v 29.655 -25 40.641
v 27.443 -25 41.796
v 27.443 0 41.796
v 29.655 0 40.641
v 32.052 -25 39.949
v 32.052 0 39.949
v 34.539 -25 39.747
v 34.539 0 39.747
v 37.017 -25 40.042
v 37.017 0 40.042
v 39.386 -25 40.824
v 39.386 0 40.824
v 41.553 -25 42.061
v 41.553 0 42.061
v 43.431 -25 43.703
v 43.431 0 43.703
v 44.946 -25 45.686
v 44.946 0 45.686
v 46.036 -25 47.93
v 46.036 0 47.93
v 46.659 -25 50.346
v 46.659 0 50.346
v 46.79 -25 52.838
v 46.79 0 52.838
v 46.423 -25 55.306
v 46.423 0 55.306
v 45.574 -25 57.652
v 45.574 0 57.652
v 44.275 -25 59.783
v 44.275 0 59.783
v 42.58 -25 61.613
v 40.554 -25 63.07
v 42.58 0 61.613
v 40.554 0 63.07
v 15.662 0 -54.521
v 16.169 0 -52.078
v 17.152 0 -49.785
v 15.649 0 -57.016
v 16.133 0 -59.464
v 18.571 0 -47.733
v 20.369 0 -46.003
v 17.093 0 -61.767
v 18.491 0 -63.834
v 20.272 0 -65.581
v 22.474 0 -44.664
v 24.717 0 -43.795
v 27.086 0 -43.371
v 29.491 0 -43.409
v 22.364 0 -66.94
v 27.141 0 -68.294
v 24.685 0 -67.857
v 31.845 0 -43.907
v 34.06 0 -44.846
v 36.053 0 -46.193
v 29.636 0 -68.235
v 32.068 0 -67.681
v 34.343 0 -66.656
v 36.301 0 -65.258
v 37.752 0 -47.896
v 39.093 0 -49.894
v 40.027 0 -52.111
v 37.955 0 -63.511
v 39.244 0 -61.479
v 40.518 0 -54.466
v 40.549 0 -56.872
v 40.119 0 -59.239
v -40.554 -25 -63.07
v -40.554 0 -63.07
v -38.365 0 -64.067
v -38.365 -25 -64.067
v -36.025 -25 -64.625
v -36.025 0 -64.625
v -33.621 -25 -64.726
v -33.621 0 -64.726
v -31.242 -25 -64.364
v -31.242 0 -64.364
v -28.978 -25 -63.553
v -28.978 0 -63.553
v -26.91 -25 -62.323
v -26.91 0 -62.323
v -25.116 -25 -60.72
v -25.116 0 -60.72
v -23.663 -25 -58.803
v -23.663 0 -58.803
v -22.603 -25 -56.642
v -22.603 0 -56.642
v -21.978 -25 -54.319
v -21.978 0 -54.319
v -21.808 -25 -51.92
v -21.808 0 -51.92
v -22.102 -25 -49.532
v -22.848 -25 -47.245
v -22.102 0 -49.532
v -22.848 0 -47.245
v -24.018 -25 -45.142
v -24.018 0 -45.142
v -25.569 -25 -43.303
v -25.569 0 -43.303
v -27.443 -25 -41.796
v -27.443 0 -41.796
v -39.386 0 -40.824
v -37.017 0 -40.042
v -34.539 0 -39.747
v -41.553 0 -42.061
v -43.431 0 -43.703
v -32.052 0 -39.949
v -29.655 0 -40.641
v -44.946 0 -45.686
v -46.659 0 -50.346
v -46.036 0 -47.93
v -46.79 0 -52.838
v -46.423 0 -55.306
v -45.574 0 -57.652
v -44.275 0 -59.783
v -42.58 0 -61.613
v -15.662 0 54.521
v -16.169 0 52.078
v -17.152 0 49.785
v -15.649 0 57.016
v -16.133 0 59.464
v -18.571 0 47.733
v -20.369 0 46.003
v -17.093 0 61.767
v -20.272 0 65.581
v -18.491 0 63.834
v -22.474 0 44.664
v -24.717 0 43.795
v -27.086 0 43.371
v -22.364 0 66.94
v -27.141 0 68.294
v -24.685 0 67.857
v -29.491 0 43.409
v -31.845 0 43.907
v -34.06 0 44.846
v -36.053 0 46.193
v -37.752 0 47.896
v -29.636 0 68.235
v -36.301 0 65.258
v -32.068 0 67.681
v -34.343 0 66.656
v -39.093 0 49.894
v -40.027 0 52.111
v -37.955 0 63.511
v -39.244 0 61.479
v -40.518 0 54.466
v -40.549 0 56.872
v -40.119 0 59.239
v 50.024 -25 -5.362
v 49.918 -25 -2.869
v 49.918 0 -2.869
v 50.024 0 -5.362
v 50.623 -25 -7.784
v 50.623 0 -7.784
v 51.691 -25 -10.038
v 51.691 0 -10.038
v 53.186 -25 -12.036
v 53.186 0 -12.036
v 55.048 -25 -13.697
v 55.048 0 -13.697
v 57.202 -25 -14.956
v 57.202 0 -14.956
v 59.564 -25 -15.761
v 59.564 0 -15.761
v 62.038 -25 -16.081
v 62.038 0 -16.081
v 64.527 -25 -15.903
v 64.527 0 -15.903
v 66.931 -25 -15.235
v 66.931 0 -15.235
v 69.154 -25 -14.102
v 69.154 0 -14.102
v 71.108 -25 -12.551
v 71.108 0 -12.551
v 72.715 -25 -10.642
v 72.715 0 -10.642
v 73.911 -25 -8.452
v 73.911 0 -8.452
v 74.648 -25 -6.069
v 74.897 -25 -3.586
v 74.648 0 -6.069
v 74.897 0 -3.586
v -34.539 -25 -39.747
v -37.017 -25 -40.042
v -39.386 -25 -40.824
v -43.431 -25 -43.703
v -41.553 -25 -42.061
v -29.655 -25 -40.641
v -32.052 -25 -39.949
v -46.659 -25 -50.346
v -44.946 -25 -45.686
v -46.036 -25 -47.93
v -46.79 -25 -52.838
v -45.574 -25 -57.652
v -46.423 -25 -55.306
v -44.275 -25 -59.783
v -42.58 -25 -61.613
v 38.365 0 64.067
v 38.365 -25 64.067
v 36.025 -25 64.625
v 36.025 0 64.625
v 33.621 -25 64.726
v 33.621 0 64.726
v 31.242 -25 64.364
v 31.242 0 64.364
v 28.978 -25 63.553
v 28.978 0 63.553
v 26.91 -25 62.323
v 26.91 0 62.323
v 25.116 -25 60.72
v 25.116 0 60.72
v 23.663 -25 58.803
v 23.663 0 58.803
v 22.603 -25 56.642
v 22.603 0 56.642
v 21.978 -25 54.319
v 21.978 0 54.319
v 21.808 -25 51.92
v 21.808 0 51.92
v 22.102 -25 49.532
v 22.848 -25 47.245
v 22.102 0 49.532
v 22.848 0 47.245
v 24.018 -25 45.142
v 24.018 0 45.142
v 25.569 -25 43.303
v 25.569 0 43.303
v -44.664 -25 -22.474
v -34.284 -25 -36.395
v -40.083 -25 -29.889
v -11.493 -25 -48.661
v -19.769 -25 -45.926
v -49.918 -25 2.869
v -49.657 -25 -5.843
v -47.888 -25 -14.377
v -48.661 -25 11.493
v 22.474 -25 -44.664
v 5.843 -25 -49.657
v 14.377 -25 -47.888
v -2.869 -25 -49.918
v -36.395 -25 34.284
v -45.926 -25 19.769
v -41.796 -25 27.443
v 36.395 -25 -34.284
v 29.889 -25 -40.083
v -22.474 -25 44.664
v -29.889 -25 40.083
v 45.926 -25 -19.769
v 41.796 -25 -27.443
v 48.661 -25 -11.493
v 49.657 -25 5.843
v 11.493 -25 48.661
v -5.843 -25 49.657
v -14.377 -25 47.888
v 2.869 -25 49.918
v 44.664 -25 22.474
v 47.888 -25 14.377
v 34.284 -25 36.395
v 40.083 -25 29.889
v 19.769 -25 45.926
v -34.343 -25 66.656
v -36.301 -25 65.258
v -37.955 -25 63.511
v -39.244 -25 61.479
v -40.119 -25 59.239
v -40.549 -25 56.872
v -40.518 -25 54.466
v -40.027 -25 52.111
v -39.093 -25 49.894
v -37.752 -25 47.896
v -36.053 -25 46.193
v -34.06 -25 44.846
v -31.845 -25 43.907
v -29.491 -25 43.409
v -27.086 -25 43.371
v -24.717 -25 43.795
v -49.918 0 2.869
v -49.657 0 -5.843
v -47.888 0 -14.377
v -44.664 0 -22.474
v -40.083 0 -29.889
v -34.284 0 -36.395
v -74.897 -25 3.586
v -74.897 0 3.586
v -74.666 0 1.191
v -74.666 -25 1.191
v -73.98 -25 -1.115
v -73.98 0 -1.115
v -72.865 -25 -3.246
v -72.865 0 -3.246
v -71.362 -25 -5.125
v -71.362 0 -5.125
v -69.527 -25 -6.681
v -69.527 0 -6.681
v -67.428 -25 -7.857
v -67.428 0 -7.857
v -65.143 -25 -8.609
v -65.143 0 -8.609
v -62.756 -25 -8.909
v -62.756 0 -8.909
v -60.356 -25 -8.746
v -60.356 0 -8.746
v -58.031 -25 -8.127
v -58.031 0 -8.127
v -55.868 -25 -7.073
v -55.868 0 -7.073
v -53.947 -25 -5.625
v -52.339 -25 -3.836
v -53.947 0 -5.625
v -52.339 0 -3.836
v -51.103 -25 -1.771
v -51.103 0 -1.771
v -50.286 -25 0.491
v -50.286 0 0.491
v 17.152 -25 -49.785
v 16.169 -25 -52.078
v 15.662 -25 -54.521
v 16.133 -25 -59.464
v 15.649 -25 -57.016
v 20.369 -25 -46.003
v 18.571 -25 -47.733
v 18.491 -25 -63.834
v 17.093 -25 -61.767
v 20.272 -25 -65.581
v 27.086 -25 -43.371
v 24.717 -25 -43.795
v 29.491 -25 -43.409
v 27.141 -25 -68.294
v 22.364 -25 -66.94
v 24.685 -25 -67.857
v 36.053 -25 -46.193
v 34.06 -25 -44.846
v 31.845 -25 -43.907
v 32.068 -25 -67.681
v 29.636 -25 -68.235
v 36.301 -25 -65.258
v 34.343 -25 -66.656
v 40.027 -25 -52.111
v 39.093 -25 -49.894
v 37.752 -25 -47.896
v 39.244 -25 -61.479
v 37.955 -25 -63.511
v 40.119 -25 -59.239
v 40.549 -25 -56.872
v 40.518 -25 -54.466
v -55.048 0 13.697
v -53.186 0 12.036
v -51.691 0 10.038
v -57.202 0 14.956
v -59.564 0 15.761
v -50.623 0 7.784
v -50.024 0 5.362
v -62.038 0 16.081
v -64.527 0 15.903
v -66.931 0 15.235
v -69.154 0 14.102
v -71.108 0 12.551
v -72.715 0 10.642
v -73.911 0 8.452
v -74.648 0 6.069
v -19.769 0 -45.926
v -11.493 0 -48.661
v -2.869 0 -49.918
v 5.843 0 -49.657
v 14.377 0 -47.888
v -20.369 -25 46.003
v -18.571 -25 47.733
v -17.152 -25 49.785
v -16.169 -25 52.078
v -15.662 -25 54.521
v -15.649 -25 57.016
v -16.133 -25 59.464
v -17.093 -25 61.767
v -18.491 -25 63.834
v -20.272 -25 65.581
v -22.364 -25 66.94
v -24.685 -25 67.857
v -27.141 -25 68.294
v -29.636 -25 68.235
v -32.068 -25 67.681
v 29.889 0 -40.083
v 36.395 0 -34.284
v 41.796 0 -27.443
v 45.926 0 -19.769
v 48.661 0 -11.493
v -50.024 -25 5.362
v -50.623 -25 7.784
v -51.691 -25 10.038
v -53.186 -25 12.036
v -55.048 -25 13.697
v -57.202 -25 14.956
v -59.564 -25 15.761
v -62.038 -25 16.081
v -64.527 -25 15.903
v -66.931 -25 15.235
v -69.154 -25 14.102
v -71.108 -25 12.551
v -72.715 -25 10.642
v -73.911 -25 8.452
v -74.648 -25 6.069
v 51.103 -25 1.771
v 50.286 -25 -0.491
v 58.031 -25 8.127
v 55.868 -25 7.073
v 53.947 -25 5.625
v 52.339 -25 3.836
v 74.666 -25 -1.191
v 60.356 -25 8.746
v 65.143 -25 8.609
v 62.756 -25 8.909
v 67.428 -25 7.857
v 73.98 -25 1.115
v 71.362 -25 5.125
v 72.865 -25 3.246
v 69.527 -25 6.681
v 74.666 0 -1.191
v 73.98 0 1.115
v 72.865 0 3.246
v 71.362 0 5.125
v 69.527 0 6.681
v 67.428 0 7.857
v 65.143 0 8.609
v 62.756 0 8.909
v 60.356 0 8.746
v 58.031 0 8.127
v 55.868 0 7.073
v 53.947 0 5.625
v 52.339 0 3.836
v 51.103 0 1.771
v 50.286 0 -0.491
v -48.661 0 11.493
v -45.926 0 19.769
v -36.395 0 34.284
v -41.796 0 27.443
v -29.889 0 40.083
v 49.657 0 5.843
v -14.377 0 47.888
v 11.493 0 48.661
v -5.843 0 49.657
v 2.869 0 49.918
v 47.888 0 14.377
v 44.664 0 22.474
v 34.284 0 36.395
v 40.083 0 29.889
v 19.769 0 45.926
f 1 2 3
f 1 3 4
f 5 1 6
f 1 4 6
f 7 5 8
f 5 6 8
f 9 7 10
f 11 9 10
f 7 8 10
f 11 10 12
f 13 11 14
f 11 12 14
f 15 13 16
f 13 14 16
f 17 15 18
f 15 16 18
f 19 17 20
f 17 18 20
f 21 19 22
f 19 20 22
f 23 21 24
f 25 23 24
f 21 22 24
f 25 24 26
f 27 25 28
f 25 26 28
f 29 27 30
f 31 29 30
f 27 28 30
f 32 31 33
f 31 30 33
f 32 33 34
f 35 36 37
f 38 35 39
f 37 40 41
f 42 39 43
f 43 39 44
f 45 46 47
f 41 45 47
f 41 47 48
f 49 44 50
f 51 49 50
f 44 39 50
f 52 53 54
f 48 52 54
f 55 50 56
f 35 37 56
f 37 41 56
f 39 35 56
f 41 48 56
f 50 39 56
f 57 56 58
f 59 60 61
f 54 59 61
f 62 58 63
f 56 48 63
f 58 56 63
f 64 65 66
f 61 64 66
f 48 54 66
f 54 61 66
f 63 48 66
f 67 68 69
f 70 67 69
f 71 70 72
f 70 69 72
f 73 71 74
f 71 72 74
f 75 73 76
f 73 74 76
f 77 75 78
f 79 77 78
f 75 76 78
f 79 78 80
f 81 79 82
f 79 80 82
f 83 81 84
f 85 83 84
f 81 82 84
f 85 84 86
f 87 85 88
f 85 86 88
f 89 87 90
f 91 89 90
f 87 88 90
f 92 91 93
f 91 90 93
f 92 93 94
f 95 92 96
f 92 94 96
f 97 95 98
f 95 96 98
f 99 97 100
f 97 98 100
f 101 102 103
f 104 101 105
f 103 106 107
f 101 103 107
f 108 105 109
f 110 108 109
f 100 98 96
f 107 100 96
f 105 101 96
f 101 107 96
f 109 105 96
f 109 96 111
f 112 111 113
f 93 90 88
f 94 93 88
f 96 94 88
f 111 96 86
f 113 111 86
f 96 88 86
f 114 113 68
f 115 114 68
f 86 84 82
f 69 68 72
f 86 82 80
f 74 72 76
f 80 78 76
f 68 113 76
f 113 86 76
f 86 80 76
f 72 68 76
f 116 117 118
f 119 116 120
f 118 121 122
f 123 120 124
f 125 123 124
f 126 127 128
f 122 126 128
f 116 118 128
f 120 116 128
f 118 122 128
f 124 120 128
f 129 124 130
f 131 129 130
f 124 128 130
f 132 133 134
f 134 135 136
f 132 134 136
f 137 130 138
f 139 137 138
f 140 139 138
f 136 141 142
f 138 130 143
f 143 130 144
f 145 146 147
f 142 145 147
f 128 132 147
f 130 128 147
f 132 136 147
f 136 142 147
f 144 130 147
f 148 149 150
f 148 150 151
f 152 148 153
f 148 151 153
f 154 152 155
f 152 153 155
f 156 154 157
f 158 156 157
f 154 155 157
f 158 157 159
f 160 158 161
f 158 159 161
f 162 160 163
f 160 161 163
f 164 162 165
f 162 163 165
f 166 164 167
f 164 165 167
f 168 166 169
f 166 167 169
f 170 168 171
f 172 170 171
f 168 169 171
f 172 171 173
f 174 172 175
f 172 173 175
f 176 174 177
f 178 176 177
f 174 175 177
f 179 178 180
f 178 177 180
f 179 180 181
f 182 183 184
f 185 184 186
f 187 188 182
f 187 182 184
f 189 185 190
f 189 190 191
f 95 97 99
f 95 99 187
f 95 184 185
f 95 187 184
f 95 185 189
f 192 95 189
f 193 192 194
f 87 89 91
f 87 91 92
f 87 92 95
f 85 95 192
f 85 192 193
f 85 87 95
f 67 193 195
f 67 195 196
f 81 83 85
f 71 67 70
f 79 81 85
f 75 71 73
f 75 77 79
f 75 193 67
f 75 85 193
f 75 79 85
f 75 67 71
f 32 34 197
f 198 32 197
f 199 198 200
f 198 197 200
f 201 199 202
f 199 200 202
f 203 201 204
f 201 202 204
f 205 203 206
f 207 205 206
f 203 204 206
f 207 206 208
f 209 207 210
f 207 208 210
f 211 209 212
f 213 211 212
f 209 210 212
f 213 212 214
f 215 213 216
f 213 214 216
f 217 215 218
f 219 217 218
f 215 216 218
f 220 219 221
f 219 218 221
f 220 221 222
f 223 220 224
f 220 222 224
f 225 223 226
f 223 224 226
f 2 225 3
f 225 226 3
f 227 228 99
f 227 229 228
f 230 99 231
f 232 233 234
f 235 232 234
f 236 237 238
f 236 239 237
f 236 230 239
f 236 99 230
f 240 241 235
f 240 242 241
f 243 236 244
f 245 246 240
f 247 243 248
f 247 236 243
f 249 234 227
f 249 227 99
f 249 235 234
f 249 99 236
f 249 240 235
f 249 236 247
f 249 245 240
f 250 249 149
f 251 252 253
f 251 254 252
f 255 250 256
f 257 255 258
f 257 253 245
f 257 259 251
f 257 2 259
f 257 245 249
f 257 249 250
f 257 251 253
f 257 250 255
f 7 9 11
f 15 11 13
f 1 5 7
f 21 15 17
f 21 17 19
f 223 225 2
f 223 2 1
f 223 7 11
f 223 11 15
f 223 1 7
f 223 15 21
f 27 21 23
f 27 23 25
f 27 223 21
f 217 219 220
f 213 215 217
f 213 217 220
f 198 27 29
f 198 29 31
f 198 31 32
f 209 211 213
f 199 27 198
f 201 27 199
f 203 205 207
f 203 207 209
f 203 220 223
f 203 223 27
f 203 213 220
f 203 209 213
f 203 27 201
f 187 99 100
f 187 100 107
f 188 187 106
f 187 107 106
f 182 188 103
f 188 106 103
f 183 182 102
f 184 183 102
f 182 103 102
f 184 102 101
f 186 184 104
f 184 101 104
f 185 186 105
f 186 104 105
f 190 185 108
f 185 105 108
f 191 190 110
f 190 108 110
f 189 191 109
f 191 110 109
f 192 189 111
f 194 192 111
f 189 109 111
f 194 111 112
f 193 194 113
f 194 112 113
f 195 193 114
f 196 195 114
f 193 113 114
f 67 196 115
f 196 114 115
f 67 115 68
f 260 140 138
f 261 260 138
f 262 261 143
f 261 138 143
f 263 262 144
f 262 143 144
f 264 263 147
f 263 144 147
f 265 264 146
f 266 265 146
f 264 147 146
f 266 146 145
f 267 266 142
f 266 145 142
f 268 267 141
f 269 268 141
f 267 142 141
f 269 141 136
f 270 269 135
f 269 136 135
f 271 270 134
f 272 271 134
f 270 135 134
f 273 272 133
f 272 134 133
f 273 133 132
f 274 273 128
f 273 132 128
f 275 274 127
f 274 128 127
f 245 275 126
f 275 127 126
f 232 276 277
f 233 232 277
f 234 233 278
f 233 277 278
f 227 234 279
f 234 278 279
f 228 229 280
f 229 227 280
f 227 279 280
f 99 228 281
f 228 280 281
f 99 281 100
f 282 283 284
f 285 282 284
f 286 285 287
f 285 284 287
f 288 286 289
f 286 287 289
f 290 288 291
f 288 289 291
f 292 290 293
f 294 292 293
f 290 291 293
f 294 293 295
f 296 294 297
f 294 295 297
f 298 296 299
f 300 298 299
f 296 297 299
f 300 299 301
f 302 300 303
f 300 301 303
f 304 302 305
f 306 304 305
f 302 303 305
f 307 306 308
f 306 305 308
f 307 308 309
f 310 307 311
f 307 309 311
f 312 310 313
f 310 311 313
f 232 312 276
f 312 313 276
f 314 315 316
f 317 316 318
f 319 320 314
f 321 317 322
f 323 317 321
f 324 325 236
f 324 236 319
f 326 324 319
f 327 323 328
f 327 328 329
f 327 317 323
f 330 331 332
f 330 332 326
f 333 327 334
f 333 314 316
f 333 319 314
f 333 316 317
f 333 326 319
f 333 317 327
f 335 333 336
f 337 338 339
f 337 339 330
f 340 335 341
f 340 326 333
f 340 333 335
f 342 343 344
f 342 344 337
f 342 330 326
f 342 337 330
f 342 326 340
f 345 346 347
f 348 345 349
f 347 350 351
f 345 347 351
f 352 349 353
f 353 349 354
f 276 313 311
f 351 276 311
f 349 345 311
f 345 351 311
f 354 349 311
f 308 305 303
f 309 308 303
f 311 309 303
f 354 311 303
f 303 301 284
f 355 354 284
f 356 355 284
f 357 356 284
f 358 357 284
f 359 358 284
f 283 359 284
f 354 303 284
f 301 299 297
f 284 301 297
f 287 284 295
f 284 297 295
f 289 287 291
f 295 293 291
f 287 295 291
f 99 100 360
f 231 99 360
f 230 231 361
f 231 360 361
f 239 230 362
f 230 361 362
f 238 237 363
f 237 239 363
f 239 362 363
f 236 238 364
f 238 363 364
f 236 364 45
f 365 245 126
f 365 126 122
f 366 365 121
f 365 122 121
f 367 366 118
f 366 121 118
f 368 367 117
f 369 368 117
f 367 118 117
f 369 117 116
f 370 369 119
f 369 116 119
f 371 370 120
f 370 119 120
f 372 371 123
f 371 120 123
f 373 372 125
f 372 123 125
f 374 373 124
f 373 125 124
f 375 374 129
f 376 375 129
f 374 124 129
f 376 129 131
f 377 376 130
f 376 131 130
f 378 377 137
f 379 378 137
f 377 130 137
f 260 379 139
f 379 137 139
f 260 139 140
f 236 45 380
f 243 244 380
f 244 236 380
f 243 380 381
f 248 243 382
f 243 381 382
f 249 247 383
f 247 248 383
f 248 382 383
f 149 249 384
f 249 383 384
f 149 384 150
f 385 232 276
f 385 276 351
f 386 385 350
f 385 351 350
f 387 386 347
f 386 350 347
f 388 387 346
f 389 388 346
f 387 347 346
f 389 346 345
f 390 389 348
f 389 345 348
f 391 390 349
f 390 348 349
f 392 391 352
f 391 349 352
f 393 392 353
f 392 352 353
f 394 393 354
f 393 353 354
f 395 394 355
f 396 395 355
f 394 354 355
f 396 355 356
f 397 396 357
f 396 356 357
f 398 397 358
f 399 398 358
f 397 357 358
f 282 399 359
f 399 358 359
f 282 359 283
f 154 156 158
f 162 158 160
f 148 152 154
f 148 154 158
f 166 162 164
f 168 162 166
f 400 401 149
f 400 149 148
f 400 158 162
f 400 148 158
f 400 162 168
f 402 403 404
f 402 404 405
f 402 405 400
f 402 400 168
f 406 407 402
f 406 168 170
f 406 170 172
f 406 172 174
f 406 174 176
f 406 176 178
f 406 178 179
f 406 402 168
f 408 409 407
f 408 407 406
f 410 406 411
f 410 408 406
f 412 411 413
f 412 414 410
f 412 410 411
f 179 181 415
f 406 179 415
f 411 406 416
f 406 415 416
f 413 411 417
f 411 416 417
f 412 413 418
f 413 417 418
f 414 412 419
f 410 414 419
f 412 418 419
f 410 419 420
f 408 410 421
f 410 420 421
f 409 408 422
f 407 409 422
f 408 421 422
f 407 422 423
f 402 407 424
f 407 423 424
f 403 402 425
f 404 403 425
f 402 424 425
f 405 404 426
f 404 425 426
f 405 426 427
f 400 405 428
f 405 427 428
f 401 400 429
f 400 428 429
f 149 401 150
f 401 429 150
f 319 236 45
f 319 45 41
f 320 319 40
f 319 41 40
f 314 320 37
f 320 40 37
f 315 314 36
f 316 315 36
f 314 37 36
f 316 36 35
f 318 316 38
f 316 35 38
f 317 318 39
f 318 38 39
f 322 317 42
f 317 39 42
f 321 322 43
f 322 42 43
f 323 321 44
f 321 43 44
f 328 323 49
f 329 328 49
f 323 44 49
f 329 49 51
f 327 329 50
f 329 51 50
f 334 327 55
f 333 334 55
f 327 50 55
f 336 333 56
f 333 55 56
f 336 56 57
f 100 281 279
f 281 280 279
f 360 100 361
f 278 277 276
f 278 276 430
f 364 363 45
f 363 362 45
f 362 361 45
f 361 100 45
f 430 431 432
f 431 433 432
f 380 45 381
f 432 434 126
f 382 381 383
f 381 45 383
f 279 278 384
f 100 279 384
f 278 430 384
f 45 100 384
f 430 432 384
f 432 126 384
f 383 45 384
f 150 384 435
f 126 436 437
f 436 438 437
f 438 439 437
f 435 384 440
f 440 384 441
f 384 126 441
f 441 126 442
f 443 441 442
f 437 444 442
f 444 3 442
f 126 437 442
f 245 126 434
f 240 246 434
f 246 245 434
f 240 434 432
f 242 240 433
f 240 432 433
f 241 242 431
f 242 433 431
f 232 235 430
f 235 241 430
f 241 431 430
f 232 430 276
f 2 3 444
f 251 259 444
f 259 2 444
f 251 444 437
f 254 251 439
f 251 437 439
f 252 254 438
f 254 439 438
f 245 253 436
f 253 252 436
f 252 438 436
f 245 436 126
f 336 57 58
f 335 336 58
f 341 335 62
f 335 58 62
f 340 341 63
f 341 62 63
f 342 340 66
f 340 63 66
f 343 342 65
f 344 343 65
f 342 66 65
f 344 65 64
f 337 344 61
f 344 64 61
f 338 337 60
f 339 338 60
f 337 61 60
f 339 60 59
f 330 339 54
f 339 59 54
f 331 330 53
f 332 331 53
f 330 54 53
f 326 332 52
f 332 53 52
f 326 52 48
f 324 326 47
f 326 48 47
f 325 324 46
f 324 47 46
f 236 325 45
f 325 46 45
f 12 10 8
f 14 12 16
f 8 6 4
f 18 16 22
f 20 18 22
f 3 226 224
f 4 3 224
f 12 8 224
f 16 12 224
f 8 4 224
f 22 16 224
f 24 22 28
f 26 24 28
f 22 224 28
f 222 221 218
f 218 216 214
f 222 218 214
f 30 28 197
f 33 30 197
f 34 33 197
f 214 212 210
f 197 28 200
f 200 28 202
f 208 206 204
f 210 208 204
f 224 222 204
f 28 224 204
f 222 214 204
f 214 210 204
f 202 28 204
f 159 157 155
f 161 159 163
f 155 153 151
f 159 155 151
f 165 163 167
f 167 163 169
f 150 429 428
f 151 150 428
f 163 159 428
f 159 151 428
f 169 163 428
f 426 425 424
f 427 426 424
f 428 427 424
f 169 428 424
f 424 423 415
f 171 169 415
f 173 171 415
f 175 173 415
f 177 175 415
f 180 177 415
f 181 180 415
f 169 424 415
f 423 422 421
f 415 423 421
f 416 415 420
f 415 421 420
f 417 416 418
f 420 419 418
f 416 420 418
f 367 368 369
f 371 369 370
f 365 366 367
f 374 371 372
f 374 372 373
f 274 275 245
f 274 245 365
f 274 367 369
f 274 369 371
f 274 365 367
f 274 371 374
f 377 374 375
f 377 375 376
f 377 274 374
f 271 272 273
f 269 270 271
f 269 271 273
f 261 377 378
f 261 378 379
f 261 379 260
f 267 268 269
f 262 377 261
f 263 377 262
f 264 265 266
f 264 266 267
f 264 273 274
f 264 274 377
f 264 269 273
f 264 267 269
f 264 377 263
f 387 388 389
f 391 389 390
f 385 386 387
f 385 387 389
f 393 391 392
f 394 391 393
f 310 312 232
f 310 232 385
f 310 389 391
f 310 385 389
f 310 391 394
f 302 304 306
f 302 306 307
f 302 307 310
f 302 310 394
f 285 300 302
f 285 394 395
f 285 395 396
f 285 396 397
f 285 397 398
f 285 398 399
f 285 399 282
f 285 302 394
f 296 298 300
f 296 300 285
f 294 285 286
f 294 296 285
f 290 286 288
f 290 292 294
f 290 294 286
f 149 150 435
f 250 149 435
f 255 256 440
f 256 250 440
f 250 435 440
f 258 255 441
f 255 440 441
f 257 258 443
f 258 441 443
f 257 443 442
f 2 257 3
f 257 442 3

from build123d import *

# Parameters (mm, degrees)
F0_R     = 50
F2_DEPTH = 25
F1_R     = 12.5
F3_DEPTH = 25
F4_COUNT = 6


with BuildPart() as f2:
    # F0 (on Front) → F2 (new body)
    with BuildSketch(Plane.XZ):
        Circle(F0_R)
    extrude(amount=F2_DEPTH)

    # F1 (on Front) → F3 (join)
    with BuildSketch(Plane.XZ):
        with Locations((62.3970379223, -3.5860366045)):
            Circle(F1_R)
    extrude(amount=F3_DEPTH)

    # F4: F2 ×6 about axis
    f4_axis = Axis((0, -25, 0), (0, -1, 0))


with BuildPart() as f2_1:
    add(f2.part)
    for i in range(1, F4_COUNT):
        add(f2.part.rotate(f4_axis, i * 360 / F4_COUNT))


solid = f2_1.part
